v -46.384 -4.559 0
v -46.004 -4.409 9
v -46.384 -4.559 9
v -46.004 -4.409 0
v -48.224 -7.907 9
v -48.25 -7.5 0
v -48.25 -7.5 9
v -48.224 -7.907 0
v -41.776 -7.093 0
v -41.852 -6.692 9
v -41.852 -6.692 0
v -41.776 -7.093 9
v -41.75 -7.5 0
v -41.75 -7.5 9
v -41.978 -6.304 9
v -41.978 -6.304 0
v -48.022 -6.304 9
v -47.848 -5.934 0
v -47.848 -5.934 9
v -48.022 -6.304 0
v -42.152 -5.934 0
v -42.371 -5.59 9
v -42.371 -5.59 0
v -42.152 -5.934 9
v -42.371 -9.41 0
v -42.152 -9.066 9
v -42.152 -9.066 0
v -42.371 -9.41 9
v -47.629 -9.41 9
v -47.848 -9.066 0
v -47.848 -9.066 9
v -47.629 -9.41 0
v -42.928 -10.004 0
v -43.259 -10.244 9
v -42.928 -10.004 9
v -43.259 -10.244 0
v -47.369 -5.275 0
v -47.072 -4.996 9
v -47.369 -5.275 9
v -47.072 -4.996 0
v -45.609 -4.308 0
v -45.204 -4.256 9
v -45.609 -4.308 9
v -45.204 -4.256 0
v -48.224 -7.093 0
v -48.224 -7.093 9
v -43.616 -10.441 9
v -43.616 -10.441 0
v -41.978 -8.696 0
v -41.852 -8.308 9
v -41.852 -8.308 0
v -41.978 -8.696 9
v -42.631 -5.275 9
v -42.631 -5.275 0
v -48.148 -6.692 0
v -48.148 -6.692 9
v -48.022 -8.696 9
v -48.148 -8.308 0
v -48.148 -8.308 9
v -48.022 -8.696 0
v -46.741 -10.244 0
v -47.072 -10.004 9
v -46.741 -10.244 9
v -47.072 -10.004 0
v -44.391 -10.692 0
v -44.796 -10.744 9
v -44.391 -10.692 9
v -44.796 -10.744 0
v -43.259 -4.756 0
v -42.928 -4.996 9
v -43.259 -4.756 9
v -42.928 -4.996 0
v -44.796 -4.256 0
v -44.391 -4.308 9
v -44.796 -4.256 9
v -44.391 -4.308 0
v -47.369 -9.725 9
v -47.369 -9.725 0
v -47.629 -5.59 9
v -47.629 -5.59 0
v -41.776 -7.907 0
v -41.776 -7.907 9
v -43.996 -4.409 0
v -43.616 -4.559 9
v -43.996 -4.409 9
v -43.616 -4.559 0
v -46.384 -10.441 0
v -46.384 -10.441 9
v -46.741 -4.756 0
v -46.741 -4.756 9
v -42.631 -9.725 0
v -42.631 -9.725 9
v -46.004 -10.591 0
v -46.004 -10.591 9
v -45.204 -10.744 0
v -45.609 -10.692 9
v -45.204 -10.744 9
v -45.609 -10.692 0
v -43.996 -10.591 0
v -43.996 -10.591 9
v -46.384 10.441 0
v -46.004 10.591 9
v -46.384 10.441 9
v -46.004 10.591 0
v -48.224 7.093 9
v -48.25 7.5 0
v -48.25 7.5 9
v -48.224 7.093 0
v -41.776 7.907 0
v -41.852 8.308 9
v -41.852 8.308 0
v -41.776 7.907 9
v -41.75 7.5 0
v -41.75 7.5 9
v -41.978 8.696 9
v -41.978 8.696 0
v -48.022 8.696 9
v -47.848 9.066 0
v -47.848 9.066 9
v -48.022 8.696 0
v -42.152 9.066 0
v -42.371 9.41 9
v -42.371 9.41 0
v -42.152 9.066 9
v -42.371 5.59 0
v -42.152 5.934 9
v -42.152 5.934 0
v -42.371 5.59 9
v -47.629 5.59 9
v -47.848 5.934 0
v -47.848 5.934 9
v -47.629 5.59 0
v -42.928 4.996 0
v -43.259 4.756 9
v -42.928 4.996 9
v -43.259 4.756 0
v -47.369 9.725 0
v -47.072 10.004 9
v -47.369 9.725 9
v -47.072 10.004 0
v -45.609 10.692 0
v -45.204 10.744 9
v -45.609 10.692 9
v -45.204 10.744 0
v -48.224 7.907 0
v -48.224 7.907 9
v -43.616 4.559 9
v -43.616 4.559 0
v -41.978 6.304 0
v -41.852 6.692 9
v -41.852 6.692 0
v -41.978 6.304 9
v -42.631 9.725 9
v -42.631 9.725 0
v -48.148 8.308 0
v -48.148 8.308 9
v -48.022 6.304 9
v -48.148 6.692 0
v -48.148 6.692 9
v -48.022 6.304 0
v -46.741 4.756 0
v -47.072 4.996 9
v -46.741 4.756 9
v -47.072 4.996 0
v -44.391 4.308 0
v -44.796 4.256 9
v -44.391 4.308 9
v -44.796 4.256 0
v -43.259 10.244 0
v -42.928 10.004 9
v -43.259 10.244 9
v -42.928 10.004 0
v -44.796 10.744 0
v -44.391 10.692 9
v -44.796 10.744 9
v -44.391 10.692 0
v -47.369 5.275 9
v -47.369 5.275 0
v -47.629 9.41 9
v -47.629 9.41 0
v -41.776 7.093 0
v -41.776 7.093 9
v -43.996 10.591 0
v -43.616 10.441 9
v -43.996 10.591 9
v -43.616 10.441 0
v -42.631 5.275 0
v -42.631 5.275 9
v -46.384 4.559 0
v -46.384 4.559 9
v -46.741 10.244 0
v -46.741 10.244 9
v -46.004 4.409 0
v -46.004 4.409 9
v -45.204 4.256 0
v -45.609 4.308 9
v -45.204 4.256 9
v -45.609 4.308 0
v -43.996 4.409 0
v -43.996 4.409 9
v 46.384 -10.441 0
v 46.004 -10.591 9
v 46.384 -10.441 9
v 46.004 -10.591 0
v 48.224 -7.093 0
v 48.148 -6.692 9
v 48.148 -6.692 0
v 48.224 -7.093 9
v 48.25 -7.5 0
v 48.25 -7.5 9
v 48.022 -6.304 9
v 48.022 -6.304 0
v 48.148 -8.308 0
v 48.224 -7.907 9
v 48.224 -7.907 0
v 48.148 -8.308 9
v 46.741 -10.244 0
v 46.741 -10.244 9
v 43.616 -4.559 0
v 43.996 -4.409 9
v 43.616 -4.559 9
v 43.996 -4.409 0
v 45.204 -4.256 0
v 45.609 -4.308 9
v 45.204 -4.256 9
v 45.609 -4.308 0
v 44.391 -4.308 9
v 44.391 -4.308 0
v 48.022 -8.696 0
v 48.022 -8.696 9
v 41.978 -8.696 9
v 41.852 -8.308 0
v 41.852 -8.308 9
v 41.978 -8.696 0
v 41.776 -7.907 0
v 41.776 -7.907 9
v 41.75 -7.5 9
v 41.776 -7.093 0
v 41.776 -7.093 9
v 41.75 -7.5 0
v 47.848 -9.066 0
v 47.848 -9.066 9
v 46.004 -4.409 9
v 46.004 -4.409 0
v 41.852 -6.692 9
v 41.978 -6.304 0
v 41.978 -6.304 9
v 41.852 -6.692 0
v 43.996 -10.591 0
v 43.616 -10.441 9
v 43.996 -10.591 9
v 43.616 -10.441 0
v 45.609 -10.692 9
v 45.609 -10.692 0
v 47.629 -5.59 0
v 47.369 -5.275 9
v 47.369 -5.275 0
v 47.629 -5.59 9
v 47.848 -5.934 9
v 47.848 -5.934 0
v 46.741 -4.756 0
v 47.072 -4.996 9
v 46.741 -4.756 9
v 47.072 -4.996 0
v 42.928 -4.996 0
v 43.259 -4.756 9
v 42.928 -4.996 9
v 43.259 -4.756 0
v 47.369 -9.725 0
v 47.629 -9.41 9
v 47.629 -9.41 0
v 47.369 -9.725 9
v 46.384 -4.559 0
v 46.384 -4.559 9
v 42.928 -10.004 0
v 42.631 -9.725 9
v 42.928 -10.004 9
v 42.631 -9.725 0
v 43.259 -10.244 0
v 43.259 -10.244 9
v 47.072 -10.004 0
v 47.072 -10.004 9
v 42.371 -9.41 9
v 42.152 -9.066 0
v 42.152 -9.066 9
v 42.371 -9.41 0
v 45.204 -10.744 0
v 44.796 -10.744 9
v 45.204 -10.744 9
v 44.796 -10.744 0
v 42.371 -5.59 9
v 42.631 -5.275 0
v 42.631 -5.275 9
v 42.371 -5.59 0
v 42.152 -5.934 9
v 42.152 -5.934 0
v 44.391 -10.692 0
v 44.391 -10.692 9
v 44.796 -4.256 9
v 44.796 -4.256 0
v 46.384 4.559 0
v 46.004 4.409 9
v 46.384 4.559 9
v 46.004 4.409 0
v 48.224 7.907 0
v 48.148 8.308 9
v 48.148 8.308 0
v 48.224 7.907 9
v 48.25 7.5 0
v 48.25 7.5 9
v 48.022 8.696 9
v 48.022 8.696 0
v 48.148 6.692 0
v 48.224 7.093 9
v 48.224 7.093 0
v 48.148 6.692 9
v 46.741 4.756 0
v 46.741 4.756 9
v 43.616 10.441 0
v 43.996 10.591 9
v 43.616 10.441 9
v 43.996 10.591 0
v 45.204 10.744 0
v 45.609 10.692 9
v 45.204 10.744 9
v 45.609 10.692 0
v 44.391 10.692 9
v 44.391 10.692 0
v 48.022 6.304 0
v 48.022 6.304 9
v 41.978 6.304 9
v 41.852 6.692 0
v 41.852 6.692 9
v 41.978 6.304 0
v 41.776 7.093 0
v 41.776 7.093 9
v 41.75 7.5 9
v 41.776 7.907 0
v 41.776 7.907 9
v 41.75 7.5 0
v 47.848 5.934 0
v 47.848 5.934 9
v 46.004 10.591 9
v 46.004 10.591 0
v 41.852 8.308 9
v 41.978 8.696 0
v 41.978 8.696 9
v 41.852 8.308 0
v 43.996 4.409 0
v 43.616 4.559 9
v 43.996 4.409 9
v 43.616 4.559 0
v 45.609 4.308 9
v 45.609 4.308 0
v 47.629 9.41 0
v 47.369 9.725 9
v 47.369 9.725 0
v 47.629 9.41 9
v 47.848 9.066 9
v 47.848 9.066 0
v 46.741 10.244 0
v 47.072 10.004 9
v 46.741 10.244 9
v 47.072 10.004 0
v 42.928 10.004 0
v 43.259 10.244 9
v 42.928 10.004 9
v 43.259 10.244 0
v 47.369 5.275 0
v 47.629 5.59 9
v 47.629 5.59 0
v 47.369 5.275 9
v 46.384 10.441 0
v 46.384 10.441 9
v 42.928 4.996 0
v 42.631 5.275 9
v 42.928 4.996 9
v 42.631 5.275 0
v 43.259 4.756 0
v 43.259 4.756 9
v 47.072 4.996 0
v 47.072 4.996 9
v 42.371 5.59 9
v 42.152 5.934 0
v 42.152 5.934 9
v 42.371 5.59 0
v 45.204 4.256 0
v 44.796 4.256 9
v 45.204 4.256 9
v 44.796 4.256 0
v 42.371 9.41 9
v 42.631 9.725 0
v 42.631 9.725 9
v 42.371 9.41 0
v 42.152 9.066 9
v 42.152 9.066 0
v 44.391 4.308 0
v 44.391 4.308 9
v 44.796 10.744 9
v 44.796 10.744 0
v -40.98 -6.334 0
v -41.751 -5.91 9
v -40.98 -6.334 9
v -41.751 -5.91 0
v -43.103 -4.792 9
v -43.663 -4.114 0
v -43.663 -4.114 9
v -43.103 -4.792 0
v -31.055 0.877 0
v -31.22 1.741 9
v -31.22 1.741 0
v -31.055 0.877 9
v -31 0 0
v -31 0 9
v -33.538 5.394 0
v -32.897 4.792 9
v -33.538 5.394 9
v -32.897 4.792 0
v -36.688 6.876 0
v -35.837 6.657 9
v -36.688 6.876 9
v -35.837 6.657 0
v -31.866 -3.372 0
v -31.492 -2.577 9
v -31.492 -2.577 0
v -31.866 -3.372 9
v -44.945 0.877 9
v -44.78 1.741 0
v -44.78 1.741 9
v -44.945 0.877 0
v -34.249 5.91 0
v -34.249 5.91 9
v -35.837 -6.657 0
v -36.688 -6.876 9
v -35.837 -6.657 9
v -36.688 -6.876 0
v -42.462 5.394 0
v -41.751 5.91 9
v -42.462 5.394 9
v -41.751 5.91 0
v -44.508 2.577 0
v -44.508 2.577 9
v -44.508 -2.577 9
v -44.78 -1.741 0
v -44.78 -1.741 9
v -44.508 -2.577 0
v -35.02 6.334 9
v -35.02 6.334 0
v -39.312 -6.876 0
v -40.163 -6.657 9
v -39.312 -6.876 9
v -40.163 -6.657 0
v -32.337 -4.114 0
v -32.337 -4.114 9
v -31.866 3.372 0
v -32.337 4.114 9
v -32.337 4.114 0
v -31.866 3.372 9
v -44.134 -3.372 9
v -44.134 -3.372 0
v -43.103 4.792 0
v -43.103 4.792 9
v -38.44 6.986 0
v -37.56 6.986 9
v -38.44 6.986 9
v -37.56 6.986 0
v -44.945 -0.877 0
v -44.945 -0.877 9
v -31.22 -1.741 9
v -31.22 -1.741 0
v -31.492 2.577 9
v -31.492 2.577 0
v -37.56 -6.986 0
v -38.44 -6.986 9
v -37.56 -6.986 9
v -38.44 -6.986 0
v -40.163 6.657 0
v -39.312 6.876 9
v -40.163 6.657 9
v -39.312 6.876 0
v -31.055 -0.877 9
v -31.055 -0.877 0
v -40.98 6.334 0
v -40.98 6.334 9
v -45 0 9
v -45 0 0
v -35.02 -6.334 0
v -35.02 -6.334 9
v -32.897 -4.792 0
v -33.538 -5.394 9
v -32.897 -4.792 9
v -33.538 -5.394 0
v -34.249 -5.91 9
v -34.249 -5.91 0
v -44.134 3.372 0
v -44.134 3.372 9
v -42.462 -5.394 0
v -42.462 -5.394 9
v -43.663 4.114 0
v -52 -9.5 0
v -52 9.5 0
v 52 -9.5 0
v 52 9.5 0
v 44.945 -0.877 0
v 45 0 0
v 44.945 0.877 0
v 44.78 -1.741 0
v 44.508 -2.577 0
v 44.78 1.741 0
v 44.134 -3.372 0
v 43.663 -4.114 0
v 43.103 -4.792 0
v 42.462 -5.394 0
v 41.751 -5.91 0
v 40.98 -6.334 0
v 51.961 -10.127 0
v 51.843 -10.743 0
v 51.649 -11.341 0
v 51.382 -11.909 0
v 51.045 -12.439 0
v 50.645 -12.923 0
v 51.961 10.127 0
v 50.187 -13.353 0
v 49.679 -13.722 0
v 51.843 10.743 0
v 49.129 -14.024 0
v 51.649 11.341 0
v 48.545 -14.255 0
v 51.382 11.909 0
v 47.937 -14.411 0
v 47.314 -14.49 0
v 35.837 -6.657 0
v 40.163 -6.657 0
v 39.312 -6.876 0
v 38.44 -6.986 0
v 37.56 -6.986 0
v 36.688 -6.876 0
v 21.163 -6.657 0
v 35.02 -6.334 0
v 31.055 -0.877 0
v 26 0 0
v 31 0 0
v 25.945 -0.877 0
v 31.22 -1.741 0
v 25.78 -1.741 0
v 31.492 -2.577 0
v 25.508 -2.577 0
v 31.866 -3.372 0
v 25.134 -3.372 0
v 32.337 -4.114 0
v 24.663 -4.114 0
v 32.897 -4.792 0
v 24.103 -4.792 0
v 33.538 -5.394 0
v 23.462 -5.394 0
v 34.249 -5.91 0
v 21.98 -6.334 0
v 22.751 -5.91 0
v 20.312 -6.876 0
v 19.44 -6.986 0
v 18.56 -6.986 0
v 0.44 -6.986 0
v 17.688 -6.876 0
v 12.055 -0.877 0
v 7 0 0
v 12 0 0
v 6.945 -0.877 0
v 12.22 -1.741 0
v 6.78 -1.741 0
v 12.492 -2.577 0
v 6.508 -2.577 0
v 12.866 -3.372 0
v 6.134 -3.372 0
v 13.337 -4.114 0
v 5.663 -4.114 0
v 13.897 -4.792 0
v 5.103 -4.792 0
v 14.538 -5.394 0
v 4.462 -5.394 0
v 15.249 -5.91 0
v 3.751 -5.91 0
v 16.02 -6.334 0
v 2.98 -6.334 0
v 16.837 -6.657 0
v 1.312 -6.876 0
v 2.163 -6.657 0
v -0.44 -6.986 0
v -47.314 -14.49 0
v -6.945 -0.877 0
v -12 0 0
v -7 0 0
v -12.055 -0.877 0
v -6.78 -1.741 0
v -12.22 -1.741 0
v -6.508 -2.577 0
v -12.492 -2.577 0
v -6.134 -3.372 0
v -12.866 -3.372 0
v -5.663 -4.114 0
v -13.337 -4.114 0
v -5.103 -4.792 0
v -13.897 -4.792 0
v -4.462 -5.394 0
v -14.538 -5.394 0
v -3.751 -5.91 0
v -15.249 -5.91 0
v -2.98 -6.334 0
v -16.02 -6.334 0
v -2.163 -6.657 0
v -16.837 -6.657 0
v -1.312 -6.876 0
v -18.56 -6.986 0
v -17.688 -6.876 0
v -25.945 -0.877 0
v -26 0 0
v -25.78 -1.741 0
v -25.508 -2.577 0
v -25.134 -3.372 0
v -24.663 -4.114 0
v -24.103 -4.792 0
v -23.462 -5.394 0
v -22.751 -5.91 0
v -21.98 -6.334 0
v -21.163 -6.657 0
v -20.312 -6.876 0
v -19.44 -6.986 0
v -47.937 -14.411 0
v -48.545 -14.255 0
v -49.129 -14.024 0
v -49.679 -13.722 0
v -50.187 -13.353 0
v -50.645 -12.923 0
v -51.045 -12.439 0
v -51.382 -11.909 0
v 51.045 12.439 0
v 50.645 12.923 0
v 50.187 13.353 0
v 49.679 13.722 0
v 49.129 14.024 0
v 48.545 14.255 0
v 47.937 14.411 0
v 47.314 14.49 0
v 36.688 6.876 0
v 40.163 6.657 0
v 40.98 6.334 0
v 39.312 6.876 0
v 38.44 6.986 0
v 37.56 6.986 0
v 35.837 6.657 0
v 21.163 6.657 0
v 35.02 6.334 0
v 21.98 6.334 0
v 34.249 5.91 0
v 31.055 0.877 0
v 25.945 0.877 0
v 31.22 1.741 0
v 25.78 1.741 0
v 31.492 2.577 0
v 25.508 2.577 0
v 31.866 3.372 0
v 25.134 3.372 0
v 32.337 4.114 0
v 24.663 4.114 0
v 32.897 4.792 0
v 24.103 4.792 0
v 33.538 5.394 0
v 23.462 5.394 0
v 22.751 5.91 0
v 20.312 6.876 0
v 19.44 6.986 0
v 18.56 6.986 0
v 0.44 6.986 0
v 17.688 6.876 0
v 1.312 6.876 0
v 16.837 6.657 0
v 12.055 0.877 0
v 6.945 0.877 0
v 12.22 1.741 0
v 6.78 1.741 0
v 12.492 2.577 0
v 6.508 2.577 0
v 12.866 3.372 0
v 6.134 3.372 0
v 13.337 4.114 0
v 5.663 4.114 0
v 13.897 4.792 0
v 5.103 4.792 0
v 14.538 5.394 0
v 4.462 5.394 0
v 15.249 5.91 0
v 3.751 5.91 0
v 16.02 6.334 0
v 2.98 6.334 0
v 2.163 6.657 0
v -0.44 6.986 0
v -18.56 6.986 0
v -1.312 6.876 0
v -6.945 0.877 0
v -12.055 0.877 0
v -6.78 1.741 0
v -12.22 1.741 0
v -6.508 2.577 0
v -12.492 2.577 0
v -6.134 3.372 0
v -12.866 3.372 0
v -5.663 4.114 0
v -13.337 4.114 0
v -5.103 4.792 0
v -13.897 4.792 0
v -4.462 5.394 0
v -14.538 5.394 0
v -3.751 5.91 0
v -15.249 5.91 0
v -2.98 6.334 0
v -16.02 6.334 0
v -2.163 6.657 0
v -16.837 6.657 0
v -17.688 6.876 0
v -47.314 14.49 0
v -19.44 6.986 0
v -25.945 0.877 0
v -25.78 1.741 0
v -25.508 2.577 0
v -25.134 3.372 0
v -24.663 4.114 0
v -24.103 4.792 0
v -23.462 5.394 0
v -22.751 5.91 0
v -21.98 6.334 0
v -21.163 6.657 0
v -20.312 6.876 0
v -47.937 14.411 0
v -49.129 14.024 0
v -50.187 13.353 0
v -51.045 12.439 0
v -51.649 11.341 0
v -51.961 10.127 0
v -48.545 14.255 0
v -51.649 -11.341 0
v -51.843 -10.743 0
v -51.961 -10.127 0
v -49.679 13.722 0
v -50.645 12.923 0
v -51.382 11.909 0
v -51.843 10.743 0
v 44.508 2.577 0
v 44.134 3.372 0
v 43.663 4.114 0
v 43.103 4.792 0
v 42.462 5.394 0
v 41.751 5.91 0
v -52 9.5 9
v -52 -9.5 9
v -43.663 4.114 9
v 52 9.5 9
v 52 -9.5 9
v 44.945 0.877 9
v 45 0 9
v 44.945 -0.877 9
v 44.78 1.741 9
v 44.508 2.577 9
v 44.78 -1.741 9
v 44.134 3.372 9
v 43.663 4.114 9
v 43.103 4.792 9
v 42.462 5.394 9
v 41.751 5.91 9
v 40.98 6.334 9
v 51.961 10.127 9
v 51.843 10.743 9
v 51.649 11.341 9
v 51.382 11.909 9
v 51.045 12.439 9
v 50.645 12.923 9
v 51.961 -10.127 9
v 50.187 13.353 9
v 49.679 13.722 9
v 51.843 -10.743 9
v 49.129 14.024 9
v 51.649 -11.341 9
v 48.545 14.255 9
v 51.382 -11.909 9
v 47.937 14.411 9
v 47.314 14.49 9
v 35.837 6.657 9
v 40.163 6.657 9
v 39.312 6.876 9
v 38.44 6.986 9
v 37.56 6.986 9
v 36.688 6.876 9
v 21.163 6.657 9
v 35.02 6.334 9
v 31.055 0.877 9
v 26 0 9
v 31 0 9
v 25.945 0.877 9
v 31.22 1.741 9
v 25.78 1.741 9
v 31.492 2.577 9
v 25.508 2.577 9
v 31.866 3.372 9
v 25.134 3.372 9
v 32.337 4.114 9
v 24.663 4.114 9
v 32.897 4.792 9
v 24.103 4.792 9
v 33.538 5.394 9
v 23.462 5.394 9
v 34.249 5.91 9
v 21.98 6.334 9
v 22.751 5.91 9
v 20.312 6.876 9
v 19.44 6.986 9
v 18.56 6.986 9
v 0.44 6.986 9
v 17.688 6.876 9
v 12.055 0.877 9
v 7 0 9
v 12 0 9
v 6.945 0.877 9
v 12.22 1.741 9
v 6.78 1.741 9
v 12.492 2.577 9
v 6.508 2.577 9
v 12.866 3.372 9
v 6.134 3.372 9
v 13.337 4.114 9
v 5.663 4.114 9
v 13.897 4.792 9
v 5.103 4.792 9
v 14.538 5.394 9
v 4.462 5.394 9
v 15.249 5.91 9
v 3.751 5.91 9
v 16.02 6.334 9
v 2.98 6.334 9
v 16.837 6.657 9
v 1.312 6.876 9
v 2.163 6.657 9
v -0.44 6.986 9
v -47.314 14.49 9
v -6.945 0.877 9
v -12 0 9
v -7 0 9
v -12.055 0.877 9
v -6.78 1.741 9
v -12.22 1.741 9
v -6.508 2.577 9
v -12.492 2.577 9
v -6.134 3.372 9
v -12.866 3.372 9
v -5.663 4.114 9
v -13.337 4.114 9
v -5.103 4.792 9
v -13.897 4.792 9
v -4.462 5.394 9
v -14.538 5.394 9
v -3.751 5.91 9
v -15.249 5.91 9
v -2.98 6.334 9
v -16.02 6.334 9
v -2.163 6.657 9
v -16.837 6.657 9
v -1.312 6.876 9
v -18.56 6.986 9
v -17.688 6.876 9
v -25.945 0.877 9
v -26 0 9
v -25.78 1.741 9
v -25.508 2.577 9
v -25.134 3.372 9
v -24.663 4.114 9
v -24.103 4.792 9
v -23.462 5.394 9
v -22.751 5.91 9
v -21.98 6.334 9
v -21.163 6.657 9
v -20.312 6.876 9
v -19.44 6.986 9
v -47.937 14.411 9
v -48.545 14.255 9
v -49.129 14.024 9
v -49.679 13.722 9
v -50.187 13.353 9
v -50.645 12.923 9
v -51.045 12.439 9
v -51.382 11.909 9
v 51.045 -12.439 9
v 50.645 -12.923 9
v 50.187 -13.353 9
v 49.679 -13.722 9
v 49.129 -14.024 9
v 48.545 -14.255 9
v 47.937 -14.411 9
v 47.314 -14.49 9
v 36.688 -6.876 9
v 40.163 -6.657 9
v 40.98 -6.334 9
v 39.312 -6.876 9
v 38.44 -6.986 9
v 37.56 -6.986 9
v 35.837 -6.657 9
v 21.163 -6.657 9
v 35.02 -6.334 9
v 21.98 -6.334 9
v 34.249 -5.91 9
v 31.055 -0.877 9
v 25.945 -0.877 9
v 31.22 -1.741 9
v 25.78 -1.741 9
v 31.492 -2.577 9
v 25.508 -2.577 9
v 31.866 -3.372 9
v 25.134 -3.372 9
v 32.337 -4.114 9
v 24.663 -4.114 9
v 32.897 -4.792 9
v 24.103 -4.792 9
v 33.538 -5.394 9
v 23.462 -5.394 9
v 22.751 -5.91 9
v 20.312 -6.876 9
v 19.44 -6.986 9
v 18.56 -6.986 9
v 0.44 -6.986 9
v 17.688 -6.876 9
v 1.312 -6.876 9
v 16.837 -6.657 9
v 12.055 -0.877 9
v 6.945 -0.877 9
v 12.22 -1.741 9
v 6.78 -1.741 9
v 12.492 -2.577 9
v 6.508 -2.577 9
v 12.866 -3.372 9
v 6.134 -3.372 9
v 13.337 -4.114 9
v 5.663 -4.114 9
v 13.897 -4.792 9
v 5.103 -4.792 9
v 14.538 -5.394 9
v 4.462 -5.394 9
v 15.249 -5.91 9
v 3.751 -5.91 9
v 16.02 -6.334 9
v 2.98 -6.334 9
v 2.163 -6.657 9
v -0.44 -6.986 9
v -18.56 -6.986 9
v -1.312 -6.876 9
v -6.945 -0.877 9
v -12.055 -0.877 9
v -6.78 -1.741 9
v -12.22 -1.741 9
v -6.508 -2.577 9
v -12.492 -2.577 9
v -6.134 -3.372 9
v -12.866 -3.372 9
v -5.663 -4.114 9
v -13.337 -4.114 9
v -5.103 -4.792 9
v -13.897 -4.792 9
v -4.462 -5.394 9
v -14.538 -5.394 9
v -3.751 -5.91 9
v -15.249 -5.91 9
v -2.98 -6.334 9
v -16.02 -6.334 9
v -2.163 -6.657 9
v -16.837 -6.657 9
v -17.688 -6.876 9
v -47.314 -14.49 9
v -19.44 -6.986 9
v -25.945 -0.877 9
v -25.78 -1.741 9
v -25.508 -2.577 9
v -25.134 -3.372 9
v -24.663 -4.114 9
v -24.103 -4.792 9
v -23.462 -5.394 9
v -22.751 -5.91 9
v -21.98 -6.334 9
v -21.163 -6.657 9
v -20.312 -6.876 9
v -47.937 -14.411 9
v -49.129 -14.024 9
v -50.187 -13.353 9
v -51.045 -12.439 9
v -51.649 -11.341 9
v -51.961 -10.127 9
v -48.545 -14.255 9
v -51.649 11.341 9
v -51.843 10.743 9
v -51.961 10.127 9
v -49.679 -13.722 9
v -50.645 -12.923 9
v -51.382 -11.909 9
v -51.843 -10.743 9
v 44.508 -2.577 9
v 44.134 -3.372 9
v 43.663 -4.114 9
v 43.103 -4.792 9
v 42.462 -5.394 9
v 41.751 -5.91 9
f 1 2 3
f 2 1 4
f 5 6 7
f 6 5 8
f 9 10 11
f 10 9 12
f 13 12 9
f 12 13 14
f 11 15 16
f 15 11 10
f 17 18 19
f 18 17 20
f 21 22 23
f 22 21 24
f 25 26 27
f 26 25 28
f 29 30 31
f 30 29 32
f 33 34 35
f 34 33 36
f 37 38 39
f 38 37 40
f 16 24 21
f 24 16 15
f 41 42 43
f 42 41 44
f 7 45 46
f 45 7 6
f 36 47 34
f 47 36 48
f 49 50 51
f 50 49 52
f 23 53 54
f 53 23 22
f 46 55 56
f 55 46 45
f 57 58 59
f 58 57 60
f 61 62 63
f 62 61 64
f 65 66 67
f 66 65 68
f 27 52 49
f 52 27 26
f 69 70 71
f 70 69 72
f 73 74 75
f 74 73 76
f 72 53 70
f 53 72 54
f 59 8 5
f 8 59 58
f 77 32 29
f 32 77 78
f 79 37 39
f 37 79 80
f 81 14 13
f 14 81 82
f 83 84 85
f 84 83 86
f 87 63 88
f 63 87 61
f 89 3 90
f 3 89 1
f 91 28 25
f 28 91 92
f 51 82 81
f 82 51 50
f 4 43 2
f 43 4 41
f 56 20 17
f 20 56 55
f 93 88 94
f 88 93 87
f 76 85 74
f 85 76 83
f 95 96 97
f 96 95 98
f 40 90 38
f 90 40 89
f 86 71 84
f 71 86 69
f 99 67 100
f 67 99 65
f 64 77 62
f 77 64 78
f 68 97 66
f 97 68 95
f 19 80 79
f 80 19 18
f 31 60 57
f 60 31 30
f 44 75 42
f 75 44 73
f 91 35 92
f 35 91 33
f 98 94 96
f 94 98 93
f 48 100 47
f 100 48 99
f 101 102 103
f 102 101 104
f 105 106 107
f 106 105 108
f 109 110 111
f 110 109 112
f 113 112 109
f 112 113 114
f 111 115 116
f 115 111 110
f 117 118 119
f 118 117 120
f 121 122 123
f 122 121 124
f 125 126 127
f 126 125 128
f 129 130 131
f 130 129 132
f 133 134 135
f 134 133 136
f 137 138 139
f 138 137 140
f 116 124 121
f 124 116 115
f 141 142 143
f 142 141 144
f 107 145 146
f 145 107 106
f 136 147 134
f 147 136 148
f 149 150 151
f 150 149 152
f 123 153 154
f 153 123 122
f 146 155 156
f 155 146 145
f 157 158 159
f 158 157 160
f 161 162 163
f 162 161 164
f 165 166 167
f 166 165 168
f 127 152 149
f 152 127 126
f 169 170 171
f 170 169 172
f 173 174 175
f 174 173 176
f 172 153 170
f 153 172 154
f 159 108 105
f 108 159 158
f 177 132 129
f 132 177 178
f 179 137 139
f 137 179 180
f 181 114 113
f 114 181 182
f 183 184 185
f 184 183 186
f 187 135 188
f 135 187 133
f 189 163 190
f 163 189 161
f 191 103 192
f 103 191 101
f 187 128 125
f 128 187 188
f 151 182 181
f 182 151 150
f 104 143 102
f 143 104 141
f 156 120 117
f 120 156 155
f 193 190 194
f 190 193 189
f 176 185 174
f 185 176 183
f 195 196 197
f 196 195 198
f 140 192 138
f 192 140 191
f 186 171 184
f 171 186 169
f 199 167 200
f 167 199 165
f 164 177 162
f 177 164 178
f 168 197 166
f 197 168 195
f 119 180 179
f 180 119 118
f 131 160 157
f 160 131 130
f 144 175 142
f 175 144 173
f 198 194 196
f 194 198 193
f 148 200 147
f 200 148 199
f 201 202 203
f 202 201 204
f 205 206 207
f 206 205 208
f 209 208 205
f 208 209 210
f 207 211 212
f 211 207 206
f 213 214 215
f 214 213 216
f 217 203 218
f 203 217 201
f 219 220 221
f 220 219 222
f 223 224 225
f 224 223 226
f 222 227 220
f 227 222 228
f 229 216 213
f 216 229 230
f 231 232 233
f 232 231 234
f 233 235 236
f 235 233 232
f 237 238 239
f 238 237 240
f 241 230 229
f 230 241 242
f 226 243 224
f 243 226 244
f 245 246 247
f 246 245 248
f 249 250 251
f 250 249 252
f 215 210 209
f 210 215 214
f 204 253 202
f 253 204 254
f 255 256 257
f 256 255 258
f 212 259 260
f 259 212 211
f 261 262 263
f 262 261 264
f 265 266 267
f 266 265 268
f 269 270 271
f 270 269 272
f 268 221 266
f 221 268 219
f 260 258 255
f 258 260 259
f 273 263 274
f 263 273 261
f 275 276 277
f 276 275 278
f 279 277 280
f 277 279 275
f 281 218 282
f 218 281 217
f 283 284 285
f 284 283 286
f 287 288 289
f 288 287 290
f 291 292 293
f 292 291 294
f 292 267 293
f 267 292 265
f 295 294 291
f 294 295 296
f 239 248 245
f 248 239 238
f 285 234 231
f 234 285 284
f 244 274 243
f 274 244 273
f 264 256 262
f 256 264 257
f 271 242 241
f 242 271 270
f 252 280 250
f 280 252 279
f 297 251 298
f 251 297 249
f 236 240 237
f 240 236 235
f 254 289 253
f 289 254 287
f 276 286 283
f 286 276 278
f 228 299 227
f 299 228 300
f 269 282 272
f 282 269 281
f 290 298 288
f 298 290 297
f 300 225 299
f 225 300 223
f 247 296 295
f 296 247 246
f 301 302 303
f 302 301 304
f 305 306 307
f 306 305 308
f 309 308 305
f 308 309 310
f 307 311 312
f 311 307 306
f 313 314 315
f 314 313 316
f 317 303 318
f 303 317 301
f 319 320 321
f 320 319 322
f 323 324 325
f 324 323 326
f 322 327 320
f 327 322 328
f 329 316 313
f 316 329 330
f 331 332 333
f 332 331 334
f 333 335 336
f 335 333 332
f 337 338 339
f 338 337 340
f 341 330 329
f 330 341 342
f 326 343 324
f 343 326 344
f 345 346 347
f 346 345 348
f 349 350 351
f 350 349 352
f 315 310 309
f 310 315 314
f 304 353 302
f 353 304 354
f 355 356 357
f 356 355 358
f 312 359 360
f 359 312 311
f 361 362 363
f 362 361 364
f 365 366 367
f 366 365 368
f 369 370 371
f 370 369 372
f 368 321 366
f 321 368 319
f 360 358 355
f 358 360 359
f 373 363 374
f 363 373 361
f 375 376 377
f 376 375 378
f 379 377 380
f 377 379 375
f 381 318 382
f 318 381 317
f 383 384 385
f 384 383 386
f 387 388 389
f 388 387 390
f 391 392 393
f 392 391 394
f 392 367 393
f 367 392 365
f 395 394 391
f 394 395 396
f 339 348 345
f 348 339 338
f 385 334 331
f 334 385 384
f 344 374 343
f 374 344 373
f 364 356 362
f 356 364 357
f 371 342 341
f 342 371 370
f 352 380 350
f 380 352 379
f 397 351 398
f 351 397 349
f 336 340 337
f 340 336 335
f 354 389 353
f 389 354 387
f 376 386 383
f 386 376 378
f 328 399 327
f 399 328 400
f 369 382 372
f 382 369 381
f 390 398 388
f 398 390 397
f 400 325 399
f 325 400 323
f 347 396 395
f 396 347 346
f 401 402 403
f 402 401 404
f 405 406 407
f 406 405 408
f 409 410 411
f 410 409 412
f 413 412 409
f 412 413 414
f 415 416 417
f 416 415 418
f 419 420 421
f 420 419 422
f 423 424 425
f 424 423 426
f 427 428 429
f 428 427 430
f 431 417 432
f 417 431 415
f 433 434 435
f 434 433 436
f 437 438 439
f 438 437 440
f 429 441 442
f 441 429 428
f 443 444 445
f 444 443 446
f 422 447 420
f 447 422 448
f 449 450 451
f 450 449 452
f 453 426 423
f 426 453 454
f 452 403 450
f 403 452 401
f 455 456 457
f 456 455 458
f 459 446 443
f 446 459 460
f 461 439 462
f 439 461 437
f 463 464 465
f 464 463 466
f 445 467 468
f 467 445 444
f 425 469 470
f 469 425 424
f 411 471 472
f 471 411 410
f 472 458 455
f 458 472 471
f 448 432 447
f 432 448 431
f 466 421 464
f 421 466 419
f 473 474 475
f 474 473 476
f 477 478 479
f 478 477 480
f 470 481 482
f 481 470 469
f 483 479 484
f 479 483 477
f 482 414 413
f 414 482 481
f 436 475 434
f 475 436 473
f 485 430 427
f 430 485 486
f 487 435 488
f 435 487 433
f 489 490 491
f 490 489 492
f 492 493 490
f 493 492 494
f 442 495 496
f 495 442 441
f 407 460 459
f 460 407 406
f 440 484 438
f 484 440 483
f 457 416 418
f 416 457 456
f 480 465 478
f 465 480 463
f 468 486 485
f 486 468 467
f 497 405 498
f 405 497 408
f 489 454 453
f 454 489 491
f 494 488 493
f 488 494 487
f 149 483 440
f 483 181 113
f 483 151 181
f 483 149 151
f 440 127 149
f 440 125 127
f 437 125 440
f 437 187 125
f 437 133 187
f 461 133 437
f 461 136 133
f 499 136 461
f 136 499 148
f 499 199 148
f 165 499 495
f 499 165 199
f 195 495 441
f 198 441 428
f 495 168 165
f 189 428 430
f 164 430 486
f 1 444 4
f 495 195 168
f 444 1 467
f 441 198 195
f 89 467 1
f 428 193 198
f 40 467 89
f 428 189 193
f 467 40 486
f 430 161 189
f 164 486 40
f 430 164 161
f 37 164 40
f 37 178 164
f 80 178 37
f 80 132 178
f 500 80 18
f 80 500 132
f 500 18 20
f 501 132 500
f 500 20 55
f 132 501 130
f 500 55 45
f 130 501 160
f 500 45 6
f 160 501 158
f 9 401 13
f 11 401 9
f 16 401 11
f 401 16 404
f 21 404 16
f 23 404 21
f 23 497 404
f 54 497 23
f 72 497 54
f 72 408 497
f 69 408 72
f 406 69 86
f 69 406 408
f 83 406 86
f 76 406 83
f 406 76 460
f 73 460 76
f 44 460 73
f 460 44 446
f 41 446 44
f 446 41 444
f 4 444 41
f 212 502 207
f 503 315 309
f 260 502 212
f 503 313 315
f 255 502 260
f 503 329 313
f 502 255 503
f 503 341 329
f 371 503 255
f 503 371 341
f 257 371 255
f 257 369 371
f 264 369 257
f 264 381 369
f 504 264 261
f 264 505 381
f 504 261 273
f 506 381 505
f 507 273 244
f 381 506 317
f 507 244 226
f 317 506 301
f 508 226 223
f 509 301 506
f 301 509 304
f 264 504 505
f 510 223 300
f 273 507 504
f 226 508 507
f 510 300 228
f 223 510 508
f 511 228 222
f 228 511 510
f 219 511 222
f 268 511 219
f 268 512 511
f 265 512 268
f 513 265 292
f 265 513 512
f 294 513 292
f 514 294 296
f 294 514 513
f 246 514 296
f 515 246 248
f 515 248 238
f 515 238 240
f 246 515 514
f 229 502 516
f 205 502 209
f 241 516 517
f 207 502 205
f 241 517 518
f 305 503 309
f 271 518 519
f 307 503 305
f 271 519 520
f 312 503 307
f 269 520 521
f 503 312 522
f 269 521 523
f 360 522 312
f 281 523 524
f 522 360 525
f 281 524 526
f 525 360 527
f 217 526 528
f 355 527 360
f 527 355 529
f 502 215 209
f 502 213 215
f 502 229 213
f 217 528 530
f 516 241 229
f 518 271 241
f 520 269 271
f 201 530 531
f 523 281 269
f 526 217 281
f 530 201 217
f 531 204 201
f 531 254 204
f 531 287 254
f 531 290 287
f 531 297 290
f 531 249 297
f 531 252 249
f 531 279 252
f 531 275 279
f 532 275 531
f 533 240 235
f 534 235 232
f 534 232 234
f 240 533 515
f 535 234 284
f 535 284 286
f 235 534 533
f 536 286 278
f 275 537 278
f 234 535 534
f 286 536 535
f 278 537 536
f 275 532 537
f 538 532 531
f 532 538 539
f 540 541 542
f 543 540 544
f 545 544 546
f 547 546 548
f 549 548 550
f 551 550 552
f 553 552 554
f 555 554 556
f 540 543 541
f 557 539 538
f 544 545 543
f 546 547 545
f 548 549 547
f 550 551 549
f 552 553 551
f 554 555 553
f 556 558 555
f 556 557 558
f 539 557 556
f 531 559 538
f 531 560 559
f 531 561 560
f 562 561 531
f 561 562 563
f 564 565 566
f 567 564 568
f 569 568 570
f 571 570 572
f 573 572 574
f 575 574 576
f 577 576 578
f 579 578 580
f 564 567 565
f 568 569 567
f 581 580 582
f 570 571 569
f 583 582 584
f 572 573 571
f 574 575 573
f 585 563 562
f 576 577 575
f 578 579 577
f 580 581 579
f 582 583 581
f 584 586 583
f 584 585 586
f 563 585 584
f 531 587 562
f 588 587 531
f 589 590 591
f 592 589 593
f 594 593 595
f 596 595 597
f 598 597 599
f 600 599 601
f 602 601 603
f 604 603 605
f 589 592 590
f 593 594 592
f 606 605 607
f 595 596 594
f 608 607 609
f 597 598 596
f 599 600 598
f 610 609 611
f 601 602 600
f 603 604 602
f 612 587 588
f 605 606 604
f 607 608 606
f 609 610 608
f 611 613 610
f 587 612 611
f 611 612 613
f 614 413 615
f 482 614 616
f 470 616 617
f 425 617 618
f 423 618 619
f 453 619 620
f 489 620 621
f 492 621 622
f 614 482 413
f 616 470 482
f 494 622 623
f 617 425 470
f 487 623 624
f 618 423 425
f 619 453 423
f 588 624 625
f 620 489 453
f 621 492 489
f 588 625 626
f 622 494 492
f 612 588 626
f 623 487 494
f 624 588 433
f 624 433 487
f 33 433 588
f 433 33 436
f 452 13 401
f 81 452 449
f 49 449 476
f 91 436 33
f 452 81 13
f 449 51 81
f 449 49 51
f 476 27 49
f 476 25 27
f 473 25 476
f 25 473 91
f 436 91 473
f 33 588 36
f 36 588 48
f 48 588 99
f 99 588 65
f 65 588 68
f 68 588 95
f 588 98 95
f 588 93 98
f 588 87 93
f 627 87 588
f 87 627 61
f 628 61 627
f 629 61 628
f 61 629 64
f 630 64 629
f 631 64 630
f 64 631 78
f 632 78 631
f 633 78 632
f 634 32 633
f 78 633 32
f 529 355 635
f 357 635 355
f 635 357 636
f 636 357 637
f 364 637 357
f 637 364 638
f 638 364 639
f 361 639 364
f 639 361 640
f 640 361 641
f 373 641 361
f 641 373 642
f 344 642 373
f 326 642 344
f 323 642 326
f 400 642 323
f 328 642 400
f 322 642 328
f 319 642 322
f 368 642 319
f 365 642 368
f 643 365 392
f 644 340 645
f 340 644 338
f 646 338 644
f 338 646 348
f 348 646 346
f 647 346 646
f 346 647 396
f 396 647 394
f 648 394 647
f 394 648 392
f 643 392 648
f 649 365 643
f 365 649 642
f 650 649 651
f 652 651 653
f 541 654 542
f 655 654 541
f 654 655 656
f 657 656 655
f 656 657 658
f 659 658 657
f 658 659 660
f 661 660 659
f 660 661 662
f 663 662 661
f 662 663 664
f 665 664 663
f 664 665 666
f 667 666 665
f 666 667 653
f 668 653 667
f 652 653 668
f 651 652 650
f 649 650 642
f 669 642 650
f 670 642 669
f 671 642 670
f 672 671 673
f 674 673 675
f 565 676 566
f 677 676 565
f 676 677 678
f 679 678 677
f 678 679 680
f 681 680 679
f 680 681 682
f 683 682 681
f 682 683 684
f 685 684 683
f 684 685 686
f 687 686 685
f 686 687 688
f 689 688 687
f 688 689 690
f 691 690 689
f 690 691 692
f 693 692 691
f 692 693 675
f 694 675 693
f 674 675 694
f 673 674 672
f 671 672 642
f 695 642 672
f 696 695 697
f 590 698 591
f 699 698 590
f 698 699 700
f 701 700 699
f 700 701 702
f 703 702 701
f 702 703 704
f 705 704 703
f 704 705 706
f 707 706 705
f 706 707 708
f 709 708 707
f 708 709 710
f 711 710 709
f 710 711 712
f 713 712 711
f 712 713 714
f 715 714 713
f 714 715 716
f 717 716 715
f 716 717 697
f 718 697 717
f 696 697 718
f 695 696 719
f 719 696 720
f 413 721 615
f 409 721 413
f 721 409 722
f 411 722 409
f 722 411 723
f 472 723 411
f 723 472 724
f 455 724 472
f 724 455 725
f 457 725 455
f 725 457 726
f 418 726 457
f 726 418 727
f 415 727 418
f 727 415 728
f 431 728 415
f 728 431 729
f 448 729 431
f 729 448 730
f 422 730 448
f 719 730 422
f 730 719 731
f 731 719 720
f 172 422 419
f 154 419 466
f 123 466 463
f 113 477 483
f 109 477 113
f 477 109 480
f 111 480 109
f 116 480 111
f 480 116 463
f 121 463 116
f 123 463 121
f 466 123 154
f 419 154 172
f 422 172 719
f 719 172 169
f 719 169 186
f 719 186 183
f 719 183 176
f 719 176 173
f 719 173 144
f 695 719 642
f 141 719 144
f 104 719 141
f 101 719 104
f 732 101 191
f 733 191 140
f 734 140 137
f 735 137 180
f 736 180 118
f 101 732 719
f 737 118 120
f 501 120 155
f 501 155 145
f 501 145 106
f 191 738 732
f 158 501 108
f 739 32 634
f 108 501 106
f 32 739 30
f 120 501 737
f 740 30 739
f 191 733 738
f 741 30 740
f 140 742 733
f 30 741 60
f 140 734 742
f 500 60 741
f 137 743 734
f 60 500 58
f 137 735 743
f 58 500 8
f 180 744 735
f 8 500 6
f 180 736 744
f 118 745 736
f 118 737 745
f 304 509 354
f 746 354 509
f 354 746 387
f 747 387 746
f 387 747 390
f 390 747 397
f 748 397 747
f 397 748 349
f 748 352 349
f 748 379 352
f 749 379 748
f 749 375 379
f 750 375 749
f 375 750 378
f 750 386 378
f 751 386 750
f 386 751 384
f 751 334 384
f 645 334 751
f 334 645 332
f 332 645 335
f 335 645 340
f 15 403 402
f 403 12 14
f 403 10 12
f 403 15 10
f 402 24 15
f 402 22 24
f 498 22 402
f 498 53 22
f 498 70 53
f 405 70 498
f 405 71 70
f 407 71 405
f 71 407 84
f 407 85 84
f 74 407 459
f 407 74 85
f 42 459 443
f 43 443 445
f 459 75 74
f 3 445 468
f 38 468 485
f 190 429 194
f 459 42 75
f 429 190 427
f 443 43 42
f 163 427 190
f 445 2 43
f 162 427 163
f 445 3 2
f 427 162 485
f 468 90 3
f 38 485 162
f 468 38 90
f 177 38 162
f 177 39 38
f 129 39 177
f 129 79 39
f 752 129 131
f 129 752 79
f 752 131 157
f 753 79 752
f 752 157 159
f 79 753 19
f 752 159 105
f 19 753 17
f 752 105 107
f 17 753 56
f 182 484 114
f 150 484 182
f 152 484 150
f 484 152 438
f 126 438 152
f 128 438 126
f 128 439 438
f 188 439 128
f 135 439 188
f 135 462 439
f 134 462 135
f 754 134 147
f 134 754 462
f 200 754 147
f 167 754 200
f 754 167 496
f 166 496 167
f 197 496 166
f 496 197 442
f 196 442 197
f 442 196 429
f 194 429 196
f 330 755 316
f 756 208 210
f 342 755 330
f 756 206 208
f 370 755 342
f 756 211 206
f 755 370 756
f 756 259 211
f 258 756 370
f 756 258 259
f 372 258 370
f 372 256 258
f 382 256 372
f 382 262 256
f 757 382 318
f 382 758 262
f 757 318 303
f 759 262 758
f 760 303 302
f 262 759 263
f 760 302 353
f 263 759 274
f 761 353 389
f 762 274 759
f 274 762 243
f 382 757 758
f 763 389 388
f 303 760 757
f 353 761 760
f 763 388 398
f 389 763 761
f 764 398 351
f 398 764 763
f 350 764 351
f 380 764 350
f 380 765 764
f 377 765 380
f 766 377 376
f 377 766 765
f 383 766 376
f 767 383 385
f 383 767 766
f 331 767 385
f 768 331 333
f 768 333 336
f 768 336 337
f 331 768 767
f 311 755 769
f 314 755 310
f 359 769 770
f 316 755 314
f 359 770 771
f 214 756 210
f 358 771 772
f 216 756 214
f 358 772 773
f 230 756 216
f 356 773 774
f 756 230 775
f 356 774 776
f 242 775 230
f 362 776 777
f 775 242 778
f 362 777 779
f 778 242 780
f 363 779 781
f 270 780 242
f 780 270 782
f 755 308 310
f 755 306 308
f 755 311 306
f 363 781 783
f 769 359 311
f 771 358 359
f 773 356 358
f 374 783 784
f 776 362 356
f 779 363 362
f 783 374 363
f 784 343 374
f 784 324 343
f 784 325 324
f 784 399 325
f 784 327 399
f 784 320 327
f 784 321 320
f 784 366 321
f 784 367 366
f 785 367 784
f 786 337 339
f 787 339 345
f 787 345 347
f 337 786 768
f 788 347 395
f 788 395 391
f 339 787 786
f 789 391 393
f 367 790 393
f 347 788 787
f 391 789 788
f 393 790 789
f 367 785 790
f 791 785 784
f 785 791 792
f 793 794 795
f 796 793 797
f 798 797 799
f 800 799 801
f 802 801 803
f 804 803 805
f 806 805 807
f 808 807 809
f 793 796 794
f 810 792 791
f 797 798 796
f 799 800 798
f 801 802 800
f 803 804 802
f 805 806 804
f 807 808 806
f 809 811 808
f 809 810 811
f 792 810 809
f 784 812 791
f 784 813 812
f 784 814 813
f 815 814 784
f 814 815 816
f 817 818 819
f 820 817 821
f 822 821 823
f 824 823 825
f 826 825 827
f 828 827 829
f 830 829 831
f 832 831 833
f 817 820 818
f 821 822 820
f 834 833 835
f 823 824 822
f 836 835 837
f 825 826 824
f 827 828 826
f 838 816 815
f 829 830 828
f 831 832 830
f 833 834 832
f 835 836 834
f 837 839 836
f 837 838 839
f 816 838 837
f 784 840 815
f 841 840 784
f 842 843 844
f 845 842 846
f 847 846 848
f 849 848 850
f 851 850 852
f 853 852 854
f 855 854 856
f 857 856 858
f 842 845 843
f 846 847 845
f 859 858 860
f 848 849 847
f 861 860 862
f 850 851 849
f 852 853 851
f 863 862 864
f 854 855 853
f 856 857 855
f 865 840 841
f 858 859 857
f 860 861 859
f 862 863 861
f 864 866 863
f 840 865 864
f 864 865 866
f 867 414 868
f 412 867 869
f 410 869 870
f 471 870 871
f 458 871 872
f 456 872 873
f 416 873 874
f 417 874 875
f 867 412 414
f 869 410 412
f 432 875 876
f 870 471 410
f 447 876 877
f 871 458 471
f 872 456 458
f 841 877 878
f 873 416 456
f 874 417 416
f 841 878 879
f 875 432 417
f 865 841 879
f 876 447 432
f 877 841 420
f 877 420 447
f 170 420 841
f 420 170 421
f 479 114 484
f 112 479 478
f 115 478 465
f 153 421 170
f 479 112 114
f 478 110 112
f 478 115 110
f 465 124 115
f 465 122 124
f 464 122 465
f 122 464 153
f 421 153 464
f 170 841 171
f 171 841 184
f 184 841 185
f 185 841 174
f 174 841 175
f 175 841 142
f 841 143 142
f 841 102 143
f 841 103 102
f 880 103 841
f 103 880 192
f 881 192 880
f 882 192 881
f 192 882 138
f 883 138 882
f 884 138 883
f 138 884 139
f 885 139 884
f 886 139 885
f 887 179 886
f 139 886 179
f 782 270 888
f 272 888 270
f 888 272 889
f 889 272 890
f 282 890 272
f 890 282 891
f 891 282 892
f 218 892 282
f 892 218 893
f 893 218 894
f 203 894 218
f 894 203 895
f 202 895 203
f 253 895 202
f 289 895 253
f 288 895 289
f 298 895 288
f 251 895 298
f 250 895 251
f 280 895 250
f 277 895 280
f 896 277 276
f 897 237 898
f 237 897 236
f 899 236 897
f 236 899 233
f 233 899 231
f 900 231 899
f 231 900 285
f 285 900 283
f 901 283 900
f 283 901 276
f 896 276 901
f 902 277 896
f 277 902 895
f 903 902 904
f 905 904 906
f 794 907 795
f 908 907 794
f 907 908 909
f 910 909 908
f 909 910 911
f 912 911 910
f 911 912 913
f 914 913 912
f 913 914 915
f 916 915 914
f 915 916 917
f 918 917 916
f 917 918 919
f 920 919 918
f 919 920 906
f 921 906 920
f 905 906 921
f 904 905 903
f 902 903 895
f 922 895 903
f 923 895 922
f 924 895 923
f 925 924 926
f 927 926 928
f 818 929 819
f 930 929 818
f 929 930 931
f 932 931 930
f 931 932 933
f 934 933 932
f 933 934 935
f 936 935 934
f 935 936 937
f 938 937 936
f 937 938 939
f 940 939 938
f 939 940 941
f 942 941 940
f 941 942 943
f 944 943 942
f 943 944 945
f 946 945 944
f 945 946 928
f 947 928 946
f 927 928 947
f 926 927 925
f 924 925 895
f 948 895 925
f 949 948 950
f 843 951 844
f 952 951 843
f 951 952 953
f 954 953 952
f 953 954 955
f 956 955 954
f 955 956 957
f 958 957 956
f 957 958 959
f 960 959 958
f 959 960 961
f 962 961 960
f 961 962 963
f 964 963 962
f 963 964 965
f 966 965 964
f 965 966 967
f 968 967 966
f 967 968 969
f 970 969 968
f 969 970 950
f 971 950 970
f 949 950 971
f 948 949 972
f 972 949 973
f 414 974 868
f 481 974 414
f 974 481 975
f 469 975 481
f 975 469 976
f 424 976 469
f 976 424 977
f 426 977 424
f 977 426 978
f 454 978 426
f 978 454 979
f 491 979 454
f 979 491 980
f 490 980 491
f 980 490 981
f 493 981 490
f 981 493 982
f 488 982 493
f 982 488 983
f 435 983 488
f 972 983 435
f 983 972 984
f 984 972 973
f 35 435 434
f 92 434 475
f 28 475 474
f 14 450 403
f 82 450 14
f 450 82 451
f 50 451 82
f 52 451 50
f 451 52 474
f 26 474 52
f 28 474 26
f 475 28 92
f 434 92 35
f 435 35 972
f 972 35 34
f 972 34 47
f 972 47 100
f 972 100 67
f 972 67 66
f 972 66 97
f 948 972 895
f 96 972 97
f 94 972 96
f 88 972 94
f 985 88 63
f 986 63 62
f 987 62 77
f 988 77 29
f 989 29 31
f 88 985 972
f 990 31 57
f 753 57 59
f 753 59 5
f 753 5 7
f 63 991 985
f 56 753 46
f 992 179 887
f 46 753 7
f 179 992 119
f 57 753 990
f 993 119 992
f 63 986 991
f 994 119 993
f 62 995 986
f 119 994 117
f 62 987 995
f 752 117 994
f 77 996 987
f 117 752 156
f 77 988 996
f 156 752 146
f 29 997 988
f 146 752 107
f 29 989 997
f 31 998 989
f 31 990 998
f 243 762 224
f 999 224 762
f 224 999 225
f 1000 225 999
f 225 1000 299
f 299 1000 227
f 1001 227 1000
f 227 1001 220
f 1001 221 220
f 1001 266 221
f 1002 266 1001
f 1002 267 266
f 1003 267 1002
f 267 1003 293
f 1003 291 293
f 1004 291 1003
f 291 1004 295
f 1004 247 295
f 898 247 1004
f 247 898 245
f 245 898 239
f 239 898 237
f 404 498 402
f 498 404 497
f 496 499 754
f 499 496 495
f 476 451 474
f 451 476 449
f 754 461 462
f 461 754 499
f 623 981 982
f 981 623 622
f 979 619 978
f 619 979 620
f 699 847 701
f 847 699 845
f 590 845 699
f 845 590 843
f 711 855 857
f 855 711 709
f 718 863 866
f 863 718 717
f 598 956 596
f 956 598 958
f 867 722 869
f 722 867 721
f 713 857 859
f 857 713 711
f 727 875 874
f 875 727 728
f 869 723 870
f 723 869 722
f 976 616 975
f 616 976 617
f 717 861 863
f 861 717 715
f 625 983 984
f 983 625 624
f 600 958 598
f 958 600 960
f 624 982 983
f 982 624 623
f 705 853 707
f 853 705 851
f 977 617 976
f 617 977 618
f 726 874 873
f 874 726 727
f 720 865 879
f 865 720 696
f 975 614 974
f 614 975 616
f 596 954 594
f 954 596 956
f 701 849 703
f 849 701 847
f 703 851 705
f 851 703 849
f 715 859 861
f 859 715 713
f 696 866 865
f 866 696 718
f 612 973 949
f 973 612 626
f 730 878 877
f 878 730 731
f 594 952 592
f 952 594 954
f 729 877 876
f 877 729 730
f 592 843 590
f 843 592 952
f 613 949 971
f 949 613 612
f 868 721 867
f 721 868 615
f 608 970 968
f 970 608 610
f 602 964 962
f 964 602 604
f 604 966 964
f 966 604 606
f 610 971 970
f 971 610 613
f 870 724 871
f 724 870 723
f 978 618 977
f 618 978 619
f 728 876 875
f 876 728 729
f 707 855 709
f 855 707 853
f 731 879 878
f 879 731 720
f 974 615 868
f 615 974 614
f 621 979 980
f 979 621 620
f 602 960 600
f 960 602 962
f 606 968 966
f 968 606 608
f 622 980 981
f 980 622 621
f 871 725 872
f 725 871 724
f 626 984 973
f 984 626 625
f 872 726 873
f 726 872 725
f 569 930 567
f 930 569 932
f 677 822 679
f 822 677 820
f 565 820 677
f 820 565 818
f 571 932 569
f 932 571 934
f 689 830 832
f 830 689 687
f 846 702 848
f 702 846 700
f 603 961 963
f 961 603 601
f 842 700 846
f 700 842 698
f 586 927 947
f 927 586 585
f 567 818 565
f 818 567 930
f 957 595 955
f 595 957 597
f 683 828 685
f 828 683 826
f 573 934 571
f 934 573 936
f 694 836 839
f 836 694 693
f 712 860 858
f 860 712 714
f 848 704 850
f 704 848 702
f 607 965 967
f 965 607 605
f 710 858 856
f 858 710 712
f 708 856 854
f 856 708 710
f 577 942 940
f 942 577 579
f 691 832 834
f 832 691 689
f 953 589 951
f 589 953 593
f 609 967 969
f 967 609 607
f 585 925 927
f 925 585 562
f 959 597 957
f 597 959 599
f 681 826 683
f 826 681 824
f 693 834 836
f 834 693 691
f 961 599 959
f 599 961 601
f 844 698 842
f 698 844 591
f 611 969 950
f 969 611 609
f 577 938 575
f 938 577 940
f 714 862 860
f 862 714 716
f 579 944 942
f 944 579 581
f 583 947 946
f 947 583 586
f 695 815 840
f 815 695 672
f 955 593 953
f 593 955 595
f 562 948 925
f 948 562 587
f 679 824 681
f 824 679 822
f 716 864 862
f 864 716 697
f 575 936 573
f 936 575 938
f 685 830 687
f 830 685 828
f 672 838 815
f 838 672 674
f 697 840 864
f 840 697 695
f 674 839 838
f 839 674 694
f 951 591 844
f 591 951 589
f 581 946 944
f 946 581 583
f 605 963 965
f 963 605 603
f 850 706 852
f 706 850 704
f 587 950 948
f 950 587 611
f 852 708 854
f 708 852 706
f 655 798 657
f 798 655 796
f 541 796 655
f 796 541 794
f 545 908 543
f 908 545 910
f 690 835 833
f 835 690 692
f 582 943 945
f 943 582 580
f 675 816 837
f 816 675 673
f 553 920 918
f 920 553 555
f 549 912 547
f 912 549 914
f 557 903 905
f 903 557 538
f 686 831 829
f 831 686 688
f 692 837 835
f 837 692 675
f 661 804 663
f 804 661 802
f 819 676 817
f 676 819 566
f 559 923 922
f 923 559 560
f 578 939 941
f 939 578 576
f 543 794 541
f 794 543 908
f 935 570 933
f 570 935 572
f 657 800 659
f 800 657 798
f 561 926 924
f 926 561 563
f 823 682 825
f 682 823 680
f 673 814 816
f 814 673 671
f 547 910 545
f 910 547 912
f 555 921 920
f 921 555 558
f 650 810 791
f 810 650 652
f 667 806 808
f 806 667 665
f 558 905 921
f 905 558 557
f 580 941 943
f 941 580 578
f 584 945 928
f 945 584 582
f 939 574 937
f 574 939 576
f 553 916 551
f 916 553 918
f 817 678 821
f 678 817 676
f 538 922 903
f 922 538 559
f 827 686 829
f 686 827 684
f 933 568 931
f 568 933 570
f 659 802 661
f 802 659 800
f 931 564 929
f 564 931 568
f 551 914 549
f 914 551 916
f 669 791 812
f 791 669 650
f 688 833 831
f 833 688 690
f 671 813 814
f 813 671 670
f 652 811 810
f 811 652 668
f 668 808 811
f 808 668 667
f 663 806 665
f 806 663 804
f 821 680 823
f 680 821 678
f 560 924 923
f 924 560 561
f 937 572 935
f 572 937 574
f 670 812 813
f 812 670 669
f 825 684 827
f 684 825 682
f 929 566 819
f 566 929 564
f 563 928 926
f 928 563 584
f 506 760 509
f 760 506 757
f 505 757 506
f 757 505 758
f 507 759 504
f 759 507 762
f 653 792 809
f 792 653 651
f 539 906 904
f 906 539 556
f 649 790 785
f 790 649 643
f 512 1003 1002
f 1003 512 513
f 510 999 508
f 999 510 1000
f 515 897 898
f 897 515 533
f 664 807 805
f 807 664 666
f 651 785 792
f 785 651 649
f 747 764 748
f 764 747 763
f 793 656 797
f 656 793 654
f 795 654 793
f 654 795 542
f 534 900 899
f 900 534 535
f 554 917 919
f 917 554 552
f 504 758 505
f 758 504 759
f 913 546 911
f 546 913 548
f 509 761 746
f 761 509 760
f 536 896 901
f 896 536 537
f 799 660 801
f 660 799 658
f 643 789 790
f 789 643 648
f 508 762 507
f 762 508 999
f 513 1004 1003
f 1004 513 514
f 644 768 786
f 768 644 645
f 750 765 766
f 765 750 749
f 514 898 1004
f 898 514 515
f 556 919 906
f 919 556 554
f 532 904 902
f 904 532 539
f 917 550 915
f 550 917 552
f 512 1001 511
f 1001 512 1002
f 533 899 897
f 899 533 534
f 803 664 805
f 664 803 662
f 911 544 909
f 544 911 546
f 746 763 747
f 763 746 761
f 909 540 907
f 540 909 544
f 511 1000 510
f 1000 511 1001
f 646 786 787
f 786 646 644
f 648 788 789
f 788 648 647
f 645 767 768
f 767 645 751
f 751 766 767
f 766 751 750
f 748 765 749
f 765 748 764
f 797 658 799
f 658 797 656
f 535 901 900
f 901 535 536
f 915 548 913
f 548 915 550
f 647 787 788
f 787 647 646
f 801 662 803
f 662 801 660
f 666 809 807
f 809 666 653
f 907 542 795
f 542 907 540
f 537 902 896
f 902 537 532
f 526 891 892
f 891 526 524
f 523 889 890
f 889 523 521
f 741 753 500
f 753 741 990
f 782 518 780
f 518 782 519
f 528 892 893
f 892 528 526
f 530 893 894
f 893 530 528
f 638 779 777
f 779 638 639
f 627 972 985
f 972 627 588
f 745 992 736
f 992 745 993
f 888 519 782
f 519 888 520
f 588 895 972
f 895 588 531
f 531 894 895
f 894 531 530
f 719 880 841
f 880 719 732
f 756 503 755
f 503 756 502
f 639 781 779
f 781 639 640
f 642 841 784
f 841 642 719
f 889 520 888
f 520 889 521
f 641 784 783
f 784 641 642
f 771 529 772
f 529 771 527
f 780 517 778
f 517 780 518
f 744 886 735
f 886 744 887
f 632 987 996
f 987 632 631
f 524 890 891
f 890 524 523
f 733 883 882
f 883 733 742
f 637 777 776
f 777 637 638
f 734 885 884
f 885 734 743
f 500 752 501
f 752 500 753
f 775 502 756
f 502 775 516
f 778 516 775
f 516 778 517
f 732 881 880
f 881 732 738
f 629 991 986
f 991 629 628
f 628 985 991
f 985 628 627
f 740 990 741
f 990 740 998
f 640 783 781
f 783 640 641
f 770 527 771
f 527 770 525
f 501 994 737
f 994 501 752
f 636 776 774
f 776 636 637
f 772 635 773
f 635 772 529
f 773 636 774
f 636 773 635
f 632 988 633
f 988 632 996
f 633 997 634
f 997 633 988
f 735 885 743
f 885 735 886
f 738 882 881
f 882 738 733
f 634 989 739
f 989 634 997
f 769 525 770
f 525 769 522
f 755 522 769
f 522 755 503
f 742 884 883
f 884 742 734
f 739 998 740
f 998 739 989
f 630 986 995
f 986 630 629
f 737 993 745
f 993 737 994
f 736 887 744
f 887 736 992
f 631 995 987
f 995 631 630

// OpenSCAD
$fn = 50;


difference() {
	union() {
		hull() {
			translate(v = [-47.0000000000, 9.5000000000, 0]) {
				cylinder(h = 9, r = 5);
			}
			translate(v = [47.0000000000, 9.5000000000, 0]) {
				cylinder(h = 9, r = 5);
			}
			translate(v = [-47.0000000000, -9.5000000000, 0]) {
				cylinder(h = 9, r = 5);
			}
			translate(v = [47.0000000000, -9.5000000000, 0]) {
				cylinder(h = 9, r = 5);
			}
		}
	}
	union() {
		#translate(v = [-45.0000000000, -7.5000000000, -100.0000000000]) {
			cylinder(h = 200, r = 3.2500000000);
		}
		#translate(v = [-45.0000000000, 7.5000000000, -100.0000000000]) {
			cylinder(h = 200, r = 3.2500000000);
		}
		#translate(v = [45.0000000000, -7.5000000000, -100.0000000000]) {
			cylinder(h = 200, r = 3.2500000000);
		}
		#translate(v = [45.0000000000, 7.5000000000, -100.0000000000]) {
			cylinder(h = 200, r = 3.2500000000);
		}
		#translate(v = [-38.0000000000, 0, 0]) {
			cylinder(h = 9, r = 7.0000000000);
		}
		#translate(v = [-19.0000000000, 0, 0]) {
			cylinder(h = 9, r = 7.0000000000);
		}
		#cylinder(h = 9, r = 7.0000000000);
		#translate(v = [19.0000000000, 0, 0]) {
			cylinder(h = 9, r = 7.0000000000);
		}
		#translate(v = [38.0000000000, 0, 0]) {
			cylinder(h = 9, r = 7.0000000000);
		}
	}
}
